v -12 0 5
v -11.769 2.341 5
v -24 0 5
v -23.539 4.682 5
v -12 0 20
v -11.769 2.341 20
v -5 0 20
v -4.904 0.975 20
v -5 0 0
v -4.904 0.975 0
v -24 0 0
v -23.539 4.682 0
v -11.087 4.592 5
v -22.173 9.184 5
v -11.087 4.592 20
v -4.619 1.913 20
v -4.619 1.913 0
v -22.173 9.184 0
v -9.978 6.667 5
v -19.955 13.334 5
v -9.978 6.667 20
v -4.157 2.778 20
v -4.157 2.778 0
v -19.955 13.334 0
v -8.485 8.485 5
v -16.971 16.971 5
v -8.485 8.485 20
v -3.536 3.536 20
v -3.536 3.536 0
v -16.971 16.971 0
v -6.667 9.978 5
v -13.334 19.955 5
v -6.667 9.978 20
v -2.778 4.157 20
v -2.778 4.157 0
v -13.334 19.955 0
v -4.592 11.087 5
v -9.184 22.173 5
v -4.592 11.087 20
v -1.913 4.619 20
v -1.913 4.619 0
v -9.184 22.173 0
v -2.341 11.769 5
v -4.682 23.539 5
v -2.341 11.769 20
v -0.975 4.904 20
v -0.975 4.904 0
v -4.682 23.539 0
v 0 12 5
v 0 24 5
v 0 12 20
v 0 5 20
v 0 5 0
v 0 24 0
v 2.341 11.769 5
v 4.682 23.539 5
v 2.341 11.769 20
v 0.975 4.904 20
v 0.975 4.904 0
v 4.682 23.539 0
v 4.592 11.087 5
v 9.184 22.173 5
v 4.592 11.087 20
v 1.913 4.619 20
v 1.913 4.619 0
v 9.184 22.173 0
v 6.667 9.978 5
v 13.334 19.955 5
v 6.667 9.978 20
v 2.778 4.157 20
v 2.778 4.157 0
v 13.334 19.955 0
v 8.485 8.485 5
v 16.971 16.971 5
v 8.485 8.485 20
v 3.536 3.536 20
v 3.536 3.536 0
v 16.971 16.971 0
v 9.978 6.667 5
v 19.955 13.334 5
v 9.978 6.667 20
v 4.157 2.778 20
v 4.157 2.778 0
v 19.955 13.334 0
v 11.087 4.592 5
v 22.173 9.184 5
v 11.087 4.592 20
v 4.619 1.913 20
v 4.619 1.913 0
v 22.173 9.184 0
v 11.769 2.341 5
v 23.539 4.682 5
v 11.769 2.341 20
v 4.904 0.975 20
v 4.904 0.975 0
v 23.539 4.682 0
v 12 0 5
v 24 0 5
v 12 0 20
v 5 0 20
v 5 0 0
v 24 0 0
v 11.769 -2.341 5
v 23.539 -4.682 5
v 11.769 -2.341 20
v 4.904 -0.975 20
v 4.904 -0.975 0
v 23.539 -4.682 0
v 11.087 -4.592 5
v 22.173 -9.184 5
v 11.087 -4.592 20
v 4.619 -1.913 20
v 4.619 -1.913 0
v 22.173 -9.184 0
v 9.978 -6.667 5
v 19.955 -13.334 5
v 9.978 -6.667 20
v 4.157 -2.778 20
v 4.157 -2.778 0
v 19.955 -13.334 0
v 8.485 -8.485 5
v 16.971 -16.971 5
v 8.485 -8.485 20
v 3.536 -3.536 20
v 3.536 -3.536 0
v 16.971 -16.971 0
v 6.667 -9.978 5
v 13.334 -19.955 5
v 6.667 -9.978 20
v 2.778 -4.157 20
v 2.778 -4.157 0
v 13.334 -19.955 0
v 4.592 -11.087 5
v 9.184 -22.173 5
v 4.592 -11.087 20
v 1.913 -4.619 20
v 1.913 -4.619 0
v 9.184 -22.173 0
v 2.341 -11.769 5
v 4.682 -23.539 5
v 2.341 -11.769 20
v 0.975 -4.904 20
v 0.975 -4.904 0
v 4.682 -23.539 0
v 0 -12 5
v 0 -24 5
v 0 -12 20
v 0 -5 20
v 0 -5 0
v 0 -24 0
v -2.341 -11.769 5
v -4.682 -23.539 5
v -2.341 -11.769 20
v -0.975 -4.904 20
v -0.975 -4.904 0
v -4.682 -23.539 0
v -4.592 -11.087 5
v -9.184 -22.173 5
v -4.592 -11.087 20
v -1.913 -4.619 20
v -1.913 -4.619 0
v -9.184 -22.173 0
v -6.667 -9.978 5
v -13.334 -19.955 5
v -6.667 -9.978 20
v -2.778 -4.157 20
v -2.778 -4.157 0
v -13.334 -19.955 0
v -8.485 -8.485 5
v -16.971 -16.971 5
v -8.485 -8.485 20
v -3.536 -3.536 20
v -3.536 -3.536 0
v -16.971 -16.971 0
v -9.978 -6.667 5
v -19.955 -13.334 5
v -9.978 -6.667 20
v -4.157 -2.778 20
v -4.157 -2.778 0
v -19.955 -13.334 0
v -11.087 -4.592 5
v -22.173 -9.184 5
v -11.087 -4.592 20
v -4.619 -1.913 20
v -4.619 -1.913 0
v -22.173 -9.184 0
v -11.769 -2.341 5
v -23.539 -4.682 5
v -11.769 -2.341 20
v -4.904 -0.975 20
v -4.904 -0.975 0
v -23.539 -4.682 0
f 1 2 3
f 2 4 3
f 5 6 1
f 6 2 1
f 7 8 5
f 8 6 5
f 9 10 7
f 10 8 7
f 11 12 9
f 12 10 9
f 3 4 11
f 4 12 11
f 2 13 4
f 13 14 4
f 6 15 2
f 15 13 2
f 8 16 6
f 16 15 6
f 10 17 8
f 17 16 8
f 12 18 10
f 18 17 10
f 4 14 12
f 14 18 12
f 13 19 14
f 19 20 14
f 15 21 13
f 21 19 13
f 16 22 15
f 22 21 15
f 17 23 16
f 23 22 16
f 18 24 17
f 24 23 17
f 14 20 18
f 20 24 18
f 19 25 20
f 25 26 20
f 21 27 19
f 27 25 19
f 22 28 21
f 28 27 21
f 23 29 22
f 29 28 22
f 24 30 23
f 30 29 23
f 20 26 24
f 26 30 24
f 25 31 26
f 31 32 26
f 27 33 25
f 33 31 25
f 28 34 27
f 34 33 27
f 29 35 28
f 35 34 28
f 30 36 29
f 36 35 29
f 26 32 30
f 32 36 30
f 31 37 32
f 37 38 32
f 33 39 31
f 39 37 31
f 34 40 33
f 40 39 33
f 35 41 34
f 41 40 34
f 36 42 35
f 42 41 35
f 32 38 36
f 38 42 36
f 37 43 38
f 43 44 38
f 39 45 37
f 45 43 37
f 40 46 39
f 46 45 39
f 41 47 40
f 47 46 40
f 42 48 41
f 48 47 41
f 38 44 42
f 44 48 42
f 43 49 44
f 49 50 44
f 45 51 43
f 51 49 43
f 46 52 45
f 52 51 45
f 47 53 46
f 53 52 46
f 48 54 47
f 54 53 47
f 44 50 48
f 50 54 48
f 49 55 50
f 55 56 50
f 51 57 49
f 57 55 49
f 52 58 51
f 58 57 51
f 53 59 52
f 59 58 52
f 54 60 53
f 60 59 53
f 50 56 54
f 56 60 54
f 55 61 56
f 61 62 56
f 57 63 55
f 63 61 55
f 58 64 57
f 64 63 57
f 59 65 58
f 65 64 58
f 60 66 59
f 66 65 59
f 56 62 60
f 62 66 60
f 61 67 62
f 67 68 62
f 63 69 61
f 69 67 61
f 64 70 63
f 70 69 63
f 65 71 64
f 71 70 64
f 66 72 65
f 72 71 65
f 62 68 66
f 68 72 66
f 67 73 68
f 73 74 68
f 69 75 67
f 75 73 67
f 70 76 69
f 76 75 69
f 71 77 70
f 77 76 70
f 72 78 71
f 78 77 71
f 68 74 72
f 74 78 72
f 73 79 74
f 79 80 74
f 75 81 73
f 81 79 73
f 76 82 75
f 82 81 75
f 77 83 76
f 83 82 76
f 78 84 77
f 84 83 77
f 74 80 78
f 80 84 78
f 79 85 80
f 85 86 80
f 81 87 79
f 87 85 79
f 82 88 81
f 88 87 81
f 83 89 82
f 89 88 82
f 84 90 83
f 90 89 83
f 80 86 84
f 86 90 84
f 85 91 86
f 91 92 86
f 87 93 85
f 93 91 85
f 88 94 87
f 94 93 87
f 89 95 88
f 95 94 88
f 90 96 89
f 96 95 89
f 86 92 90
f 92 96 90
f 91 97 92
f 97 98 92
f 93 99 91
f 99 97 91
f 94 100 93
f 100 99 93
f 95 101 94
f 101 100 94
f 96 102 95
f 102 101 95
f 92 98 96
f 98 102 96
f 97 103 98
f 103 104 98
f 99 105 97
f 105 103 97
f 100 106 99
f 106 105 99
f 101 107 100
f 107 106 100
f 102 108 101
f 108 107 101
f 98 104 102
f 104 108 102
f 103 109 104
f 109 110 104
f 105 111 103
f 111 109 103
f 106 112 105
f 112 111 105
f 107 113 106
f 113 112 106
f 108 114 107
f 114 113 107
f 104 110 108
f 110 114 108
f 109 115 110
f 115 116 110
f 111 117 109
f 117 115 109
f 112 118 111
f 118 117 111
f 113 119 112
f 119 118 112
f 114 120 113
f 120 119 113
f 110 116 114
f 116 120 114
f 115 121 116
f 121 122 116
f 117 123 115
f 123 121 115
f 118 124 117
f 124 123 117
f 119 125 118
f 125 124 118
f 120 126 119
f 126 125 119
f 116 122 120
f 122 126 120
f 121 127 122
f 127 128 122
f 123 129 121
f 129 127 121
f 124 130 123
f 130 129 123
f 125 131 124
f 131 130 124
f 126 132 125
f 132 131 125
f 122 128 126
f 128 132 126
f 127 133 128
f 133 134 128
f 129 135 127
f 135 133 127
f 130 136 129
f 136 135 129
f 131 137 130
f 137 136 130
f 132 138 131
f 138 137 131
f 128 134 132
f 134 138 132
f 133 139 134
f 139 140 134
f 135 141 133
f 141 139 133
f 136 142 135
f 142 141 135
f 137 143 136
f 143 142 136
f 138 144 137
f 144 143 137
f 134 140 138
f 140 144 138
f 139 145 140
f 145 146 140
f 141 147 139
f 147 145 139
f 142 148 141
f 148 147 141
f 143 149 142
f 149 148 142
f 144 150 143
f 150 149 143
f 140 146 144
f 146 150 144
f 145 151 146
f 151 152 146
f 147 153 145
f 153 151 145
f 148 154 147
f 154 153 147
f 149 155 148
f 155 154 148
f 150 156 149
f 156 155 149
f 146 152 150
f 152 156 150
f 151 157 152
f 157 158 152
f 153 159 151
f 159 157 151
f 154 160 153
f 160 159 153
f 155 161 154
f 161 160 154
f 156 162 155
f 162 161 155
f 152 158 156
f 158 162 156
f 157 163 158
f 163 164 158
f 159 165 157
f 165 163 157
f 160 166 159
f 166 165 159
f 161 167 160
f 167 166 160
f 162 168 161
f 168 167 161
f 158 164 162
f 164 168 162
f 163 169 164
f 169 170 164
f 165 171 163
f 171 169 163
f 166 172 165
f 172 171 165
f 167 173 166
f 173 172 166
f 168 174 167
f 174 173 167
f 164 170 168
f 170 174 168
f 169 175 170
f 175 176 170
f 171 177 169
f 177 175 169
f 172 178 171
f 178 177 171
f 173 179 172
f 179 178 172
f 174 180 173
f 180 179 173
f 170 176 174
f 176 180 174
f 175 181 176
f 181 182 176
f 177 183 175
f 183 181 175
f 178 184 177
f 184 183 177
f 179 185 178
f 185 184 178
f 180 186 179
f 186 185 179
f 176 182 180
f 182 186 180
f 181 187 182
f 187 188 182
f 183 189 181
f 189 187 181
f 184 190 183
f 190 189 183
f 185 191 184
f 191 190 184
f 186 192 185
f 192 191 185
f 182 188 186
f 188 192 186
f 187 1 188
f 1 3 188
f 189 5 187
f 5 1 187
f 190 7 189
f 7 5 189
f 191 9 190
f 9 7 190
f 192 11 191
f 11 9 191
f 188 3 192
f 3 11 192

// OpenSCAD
$fn = 32;

// ----------------------------------------------------------------------
// Revolved part: flanged bushing R24
// ----------------------------------------------------------------------

// --- parameters (mm) ---
bore_r = 5;               // bore radius
flange_r = 24;            // flange radius
flange_h = 5;             // flange thickness
sleeve_r = 12;            // sleeve radius
total_h = 20;             // overall height
revolve_angle = 360;      // revolve sweep, degrees
fit_tol = 0.05;           // declared fit tolerance (prompt contract)
free_tol = 0.3;           // declared free tolerance (prompt contract)

bore_d = 2 * bore_r;
flange_d = 2 * flange_r;
sleeve_d = 2 * sleeve_r;

profile = [[5, 0], [24, 0], [24, 5], [12, 5], [12, 20], [5, 20]];  // primary outline, 6 points, counter clockwise

// --- the one profile operation ---
rotate_extrude(angle = revolve_angle) polygon(points = profile);
